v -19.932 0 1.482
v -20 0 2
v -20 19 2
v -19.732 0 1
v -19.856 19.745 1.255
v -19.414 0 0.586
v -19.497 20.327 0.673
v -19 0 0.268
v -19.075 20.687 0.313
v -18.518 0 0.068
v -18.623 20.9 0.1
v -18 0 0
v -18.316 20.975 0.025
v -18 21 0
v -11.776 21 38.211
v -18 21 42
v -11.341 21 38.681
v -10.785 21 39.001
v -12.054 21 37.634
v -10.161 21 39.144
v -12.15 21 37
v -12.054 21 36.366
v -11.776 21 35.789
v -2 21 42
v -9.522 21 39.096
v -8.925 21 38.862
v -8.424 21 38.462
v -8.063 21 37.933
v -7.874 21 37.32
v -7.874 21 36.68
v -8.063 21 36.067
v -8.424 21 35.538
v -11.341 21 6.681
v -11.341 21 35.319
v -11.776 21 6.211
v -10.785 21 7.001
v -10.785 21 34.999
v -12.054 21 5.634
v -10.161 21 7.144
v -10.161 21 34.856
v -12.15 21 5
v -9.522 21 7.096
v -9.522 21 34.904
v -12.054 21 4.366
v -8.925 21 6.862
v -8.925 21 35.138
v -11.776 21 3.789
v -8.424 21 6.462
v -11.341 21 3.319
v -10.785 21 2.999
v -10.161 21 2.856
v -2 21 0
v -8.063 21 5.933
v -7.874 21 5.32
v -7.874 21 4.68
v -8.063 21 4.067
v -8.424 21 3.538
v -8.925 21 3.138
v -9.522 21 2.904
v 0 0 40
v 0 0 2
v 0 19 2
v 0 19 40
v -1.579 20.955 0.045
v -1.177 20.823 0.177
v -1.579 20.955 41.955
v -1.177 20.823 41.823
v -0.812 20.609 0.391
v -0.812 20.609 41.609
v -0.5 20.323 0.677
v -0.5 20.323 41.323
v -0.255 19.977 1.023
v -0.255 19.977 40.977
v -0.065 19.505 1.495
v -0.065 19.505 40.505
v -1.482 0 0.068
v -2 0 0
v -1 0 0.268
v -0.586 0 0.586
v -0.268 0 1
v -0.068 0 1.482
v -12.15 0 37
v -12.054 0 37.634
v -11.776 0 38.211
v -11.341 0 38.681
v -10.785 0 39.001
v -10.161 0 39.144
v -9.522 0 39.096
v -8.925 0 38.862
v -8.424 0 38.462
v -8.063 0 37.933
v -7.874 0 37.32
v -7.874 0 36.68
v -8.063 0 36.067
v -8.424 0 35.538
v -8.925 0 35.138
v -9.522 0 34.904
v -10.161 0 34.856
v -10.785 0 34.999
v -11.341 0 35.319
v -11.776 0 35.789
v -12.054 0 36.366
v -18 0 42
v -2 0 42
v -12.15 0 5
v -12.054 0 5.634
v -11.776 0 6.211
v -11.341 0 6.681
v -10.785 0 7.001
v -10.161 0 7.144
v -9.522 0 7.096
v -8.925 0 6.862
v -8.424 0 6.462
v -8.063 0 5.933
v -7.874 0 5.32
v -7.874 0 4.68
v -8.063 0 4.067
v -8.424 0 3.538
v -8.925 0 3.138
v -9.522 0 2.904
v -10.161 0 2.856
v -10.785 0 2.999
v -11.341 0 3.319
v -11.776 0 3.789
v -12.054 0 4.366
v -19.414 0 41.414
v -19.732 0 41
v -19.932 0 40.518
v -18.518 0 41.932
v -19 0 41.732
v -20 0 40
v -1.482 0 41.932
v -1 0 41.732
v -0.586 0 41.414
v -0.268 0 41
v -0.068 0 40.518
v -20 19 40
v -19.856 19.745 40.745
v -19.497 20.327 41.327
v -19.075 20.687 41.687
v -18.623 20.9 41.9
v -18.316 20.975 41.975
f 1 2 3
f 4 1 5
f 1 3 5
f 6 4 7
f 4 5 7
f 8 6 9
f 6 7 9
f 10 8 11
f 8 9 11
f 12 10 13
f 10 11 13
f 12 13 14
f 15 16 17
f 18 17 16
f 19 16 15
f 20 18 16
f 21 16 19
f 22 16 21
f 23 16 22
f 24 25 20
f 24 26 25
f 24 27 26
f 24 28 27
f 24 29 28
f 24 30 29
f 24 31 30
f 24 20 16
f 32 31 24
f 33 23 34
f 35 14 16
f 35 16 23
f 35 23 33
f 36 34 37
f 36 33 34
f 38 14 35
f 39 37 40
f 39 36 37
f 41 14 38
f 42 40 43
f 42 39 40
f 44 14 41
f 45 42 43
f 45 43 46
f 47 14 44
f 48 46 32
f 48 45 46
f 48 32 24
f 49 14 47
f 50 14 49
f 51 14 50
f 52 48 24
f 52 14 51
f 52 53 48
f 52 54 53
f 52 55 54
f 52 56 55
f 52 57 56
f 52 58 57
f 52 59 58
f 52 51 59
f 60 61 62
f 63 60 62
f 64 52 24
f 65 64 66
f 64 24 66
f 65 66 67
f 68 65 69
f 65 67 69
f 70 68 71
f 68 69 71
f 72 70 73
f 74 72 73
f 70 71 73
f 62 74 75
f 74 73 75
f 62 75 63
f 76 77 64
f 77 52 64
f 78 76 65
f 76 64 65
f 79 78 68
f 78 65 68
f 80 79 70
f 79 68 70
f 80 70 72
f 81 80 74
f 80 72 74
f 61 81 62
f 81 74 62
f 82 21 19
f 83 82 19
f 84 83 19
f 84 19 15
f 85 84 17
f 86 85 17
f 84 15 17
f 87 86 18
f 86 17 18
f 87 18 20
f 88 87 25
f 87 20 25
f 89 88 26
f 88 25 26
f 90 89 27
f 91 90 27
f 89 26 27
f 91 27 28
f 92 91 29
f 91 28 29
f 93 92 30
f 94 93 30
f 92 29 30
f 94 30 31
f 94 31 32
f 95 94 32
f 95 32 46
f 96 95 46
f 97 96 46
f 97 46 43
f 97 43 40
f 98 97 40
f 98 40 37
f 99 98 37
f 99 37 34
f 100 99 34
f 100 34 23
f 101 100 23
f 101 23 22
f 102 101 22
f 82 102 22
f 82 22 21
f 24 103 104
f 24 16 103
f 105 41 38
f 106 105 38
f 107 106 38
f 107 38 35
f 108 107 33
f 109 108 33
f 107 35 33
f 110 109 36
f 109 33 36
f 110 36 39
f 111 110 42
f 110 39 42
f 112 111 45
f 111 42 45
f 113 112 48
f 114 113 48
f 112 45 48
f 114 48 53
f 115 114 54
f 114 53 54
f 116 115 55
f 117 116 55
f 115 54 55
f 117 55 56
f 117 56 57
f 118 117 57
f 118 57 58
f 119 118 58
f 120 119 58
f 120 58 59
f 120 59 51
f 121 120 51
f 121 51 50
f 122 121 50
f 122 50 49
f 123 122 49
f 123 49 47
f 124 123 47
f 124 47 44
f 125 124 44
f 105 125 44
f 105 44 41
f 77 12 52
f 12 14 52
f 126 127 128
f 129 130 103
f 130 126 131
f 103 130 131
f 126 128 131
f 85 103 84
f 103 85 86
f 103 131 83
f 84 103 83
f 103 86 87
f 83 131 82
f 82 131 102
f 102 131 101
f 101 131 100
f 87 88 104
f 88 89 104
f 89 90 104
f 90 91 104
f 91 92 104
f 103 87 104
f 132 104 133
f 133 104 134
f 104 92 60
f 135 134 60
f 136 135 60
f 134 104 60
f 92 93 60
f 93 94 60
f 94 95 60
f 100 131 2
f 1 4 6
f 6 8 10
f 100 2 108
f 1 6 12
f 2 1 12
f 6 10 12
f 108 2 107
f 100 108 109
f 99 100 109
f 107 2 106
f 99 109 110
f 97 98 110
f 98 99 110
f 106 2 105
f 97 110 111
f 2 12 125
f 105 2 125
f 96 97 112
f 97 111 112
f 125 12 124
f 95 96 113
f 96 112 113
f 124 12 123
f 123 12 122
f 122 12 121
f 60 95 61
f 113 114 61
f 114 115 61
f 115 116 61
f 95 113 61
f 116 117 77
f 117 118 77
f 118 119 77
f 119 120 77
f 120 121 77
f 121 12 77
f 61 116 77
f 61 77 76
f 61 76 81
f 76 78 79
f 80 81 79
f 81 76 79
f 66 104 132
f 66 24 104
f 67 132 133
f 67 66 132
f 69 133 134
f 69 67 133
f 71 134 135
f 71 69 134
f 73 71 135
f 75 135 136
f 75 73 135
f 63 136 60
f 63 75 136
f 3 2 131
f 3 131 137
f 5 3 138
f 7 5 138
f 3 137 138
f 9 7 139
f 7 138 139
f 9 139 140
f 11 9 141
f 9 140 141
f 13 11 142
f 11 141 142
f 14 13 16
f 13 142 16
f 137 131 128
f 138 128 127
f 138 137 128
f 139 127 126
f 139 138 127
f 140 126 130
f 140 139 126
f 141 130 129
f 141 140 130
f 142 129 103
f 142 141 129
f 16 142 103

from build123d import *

# Parameters (mm, degrees)
SKETCH_1_W          = 20
SKETCH_1_H          = 21
EXTRUDE_1_DEPTH     = 42
CUT_EXTRUDE_1_REACH = 53.039
SKETCH_2_R          = 2.15
FILLET_1_R          = 2


with BuildPart() as part:
    # 草图1 → 凸台-拉伸1 (new body)
    with BuildSketch(Plane.XY):
        with Locations((-10, 10.5)):
            Rectangle(SKETCH_1_W, SKETCH_1_H)
    extrude(amount=EXTRUDE_1_DEPTH)

    # 草图2 → 切除-拉伸1 (cut, up to next)
    with BuildSketch(Plane(origin=(0, 21, 0), x_dir=(1, 0, 0), z_dir=(0, 1, 0)), mode=Mode.PRIVATE) as cut_extrude_1_sk1:
        with Locations(Location((-10, -5, 0), (0, 0, 180))):
            Circle(SKETCH_2_R)
    cut_extrude_1_tool1 = extrude(cut_extrude_1_sk1.sketch, amount=-CUT_EXTRUDE_1_REACH, mode=Mode.PRIVATE) & part.part
    # 草图2 → 切除-拉伸1 (cut, up to next)
    with BuildSketch(Plane(origin=(0, 21, 0), x_dir=(1, 0, 0), z_dir=(0, 1, 0)), mode=Mode.PRIVATE) as cut_extrude_1_sk2:
        with Locations(Location((-10, -37, 0), (0, 0, 180))):
            Circle(SKETCH_2_R)
    cut_extrude_1_tool2 = extrude(cut_extrude_1_sk2.sketch, amount=-CUT_EXTRUDE_1_REACH, mode=Mode.PRIVATE) & part.part
    add(cut_extrude_1_tool1.solids().sort_by_distance((-10, 21, 5))[0], mode=Mode.SUBTRACT)
    add(cut_extrude_1_tool2.solids().sort_by_distance((-10, 21, 37))[0], mode=Mode.SUBTRACT)

    # 圆角1
    fillet_1_edges = [part.edges().sort_by_distance(p)[0] for p in [
        (-20, 10.5, 42),
        (0, 10.5, 42),
        (-20, 10.5, 0),
        (0, 10.5, 0),
        (-20, 21, 21),
        (0, 21, 21),
    ]]
    fillet(fillet_1_edges, radius=FILLET_1_R)


solid = part.part
